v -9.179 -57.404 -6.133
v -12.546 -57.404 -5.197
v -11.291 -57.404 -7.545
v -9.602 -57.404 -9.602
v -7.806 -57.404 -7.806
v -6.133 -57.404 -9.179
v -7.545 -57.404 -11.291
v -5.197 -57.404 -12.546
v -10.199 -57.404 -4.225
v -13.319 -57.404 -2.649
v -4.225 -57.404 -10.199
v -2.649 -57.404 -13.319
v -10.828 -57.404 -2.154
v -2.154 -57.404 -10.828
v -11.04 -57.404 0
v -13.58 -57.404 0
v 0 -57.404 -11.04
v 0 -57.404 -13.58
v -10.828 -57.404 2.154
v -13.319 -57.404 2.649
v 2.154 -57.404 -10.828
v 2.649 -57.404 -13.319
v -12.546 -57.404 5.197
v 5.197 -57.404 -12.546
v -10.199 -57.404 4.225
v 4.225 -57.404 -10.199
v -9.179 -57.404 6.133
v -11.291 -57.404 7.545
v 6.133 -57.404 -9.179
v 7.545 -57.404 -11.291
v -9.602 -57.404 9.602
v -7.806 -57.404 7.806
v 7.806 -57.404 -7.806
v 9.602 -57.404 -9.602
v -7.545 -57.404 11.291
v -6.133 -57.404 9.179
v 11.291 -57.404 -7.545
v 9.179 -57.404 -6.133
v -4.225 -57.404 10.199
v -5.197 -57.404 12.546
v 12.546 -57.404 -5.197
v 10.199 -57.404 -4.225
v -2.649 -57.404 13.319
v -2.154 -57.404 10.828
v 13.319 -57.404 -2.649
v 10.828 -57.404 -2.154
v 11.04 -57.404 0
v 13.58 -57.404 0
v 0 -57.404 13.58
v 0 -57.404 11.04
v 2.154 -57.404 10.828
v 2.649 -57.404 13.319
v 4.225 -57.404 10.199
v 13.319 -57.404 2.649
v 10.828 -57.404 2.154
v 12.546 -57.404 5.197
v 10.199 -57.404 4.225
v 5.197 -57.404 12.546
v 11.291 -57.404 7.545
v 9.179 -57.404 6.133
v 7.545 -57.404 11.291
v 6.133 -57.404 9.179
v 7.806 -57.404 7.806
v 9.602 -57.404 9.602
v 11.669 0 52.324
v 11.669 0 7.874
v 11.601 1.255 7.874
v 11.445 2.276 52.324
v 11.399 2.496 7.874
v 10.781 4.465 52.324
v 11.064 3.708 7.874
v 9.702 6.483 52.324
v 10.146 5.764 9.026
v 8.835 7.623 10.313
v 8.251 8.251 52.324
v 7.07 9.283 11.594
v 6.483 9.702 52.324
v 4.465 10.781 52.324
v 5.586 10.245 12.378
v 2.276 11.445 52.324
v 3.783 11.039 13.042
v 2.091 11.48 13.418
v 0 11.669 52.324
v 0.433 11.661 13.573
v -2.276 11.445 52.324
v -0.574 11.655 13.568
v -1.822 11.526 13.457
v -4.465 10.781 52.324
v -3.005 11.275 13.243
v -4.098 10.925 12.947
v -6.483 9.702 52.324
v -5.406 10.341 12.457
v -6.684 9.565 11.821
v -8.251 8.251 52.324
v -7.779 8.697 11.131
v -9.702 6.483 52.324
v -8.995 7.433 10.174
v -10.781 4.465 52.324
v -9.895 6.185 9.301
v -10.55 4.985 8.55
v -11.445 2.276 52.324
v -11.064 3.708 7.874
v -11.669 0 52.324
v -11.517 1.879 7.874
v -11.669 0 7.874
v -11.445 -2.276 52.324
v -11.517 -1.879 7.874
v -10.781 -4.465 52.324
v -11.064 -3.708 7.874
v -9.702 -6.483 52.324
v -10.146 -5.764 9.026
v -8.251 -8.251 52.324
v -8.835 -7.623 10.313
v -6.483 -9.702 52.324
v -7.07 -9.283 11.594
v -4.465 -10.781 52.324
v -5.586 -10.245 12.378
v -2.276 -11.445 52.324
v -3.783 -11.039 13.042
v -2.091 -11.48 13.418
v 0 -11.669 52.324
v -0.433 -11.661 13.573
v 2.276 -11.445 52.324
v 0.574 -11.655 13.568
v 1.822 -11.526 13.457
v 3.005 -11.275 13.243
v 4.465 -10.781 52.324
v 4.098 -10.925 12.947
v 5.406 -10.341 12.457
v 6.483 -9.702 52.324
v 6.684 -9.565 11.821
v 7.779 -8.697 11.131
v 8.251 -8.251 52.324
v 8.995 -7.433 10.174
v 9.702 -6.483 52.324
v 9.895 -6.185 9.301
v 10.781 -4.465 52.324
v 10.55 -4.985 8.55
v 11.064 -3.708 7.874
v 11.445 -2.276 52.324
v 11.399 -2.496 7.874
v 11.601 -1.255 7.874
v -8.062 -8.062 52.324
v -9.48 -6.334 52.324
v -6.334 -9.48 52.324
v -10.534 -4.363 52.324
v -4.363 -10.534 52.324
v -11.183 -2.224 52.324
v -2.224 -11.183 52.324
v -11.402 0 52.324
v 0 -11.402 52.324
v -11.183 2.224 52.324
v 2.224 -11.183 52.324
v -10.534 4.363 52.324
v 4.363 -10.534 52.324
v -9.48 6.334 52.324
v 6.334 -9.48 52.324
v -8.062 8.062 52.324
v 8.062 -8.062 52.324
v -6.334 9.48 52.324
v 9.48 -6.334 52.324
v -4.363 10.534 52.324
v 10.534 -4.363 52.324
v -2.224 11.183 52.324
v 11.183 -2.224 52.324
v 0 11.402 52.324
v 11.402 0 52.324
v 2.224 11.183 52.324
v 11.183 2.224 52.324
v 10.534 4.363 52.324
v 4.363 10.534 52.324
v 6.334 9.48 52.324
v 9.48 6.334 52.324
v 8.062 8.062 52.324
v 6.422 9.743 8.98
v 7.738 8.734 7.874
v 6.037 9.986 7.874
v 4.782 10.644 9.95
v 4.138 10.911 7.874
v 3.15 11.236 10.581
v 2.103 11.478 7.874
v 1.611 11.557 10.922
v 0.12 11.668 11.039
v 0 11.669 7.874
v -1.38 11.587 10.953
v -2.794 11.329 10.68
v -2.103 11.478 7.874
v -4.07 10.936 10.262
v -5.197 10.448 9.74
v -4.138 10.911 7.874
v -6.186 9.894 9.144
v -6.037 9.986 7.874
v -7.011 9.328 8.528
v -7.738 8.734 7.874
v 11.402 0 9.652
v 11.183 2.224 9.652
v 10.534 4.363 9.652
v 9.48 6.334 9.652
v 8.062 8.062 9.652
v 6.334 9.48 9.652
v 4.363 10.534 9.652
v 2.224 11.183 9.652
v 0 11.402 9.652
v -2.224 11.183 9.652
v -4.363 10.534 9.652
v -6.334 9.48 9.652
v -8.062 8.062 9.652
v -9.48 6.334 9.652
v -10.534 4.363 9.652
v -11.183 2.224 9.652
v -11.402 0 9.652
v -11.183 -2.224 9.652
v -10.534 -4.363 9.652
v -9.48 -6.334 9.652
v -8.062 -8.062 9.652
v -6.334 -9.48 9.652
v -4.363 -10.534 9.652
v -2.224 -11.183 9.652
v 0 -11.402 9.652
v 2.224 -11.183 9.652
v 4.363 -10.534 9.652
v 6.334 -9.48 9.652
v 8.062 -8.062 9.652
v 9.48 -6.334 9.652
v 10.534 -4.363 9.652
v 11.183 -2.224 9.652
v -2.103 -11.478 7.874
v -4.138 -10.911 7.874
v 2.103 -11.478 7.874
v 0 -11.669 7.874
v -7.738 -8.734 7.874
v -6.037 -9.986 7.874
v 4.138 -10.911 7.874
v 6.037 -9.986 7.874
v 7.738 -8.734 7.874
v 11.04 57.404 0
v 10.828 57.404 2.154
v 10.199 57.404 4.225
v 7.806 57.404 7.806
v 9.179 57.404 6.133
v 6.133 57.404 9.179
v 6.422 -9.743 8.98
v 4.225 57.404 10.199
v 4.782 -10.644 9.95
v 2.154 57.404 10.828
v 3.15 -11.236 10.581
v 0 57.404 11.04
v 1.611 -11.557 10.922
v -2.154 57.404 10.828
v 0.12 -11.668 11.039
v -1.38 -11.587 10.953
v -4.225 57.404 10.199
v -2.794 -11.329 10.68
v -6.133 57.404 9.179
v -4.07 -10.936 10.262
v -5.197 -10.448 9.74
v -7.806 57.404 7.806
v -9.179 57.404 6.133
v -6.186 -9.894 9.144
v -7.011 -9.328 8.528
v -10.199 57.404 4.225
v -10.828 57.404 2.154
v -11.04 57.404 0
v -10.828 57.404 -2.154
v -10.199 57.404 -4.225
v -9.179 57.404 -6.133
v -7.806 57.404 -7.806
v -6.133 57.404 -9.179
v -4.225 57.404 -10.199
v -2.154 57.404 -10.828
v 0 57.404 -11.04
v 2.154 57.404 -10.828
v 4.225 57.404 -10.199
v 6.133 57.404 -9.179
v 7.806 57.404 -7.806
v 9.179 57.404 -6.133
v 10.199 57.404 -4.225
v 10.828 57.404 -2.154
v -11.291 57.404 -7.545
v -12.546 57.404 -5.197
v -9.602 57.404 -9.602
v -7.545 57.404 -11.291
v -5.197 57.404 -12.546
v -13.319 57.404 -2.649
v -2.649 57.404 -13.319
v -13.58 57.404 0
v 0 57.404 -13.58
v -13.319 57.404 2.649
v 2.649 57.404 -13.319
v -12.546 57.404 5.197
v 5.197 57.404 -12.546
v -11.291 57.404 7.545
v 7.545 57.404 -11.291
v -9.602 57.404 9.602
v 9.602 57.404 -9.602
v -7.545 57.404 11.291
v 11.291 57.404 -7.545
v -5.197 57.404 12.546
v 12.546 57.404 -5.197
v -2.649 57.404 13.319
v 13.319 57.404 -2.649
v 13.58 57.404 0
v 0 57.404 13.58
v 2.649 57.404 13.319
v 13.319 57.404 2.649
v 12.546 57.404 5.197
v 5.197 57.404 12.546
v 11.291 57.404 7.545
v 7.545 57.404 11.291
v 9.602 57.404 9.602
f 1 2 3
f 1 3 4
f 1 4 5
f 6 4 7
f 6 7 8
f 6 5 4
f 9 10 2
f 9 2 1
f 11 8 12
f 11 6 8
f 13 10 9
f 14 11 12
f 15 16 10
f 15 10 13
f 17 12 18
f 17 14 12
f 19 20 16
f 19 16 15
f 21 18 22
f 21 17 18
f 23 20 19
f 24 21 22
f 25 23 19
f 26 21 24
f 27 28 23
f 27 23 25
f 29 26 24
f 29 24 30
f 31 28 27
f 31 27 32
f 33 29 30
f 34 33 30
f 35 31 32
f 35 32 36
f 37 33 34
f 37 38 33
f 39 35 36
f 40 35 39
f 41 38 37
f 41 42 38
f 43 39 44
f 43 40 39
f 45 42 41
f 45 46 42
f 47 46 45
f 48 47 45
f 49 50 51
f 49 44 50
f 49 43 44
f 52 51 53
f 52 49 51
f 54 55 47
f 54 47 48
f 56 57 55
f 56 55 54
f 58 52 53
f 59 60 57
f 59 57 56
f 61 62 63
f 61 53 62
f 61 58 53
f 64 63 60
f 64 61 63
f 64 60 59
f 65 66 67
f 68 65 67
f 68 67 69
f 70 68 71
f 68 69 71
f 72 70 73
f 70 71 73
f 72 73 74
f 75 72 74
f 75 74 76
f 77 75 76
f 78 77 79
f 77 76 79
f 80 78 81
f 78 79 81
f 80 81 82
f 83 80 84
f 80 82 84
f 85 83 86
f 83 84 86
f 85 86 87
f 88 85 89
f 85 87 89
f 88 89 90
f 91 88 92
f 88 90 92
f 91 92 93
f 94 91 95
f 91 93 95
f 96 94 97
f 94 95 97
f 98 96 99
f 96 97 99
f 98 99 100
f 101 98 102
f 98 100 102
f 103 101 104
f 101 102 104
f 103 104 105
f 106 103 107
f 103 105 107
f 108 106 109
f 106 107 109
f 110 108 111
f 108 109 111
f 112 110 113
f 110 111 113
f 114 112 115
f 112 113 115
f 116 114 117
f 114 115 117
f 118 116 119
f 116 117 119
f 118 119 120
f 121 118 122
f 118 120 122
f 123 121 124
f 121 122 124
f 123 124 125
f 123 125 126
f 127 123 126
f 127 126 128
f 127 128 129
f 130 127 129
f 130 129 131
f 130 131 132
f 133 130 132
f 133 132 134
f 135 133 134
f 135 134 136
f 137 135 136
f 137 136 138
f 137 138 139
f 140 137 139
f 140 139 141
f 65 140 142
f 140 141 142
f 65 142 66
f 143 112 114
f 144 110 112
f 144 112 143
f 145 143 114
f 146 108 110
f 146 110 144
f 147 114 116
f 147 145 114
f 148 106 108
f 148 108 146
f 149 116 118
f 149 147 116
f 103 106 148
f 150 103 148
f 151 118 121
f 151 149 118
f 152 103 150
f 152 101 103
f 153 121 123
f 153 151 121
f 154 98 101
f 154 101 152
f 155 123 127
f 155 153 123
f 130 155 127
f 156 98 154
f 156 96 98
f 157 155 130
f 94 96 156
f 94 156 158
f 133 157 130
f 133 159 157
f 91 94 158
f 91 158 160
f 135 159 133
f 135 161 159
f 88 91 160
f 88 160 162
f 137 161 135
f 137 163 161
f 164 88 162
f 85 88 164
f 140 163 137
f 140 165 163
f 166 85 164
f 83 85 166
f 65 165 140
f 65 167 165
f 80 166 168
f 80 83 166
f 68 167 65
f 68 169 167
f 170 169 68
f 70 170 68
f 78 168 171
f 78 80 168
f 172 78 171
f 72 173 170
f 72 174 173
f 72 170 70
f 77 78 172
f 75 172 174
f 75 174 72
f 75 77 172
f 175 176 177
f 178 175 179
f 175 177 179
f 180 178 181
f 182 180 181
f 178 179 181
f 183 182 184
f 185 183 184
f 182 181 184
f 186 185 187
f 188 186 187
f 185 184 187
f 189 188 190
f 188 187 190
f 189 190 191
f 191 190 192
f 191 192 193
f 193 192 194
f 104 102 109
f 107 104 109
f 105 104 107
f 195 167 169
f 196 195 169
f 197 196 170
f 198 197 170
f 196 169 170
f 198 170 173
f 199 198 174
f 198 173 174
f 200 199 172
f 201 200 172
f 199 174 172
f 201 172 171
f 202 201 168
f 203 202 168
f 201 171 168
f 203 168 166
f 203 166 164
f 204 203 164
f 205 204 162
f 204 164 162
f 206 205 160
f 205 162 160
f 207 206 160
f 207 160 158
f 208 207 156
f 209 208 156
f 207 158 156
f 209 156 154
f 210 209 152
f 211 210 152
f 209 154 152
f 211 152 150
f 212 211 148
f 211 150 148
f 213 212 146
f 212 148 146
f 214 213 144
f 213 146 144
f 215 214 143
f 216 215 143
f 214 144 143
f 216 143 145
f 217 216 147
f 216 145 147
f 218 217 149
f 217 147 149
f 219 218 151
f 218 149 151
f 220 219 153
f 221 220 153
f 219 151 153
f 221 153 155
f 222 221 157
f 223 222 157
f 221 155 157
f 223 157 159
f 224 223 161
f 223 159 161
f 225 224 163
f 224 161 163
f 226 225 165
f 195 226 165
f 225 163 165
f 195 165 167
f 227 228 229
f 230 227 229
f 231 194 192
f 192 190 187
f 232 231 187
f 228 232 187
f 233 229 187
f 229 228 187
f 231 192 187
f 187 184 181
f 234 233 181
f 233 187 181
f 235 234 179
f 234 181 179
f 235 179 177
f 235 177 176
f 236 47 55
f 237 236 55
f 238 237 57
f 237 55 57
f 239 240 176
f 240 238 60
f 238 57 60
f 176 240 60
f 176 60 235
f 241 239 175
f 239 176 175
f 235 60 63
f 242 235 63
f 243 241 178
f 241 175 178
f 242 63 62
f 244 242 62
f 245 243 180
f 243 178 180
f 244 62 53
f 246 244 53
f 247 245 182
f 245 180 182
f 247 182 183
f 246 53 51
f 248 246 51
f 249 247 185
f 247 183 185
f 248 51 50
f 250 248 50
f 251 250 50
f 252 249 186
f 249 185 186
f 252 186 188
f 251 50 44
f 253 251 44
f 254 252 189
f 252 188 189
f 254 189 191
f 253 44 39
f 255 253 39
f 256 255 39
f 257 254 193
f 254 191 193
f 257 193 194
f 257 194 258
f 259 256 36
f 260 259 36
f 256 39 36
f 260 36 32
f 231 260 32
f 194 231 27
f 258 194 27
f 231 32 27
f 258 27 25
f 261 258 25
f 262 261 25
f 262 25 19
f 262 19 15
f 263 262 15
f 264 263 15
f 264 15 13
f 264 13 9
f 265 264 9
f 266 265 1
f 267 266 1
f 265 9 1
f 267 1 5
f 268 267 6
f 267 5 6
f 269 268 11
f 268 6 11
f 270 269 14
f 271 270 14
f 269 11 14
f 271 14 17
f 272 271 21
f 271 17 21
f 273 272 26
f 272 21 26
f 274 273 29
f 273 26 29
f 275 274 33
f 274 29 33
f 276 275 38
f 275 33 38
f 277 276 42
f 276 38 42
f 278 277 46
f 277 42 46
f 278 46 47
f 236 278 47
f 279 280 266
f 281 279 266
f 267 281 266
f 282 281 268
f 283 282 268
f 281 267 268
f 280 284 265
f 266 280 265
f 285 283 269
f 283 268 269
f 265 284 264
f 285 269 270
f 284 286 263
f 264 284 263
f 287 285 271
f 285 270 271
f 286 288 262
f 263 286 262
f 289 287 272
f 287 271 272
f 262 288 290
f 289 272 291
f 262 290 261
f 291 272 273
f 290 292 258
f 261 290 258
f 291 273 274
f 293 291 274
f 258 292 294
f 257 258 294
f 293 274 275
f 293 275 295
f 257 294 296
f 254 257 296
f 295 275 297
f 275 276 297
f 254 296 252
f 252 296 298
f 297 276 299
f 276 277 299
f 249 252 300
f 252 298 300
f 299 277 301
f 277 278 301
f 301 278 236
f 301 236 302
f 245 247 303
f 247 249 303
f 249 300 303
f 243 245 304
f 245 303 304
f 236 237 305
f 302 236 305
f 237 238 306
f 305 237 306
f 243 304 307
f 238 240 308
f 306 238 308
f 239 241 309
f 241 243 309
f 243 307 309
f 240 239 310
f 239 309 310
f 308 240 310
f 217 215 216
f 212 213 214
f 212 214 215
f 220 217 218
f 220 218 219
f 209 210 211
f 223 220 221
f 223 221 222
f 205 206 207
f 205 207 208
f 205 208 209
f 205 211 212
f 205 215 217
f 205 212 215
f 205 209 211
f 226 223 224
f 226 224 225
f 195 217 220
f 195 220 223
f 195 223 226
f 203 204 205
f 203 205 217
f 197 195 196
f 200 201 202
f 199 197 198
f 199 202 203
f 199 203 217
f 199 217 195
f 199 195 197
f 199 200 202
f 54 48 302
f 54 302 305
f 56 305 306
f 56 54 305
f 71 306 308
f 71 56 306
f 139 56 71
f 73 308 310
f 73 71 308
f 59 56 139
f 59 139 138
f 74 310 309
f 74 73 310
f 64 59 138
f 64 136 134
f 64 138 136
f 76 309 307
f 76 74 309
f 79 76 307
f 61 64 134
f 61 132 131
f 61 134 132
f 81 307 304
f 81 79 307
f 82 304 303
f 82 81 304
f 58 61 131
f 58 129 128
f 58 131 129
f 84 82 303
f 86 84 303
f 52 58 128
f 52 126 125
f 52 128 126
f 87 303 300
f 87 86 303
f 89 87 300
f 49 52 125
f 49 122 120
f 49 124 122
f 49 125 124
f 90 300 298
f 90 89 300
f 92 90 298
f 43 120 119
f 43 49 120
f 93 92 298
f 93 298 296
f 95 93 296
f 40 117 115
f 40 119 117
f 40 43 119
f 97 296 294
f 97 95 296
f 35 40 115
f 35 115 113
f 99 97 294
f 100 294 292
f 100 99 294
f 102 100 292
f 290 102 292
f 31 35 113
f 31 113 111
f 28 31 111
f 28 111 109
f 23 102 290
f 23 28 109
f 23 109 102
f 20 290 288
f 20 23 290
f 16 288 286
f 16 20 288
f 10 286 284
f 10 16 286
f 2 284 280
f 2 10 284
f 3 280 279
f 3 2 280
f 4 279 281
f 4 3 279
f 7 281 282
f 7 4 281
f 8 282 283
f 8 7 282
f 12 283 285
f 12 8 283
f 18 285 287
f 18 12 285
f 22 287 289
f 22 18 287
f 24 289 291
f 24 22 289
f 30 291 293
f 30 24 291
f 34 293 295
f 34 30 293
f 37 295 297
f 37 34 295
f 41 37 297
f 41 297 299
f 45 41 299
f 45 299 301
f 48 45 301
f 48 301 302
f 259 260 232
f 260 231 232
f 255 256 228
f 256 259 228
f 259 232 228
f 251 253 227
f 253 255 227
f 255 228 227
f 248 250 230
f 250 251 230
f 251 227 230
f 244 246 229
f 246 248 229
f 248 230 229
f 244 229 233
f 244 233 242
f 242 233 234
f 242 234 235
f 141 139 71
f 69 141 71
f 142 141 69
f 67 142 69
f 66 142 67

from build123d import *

# Parameters (mm, degrees)
F0_R     = 13.579833
F1_DEPTH = 57.404
F2_T     = -2.54
F4_R     = 11.66888
F5_DEPTH = 44.45
F6_R     = 11.401717
F7_DEPTH = 42.672


with BuildPart() as f1:
    # F0 (on Front) → F1 (new body, symmetric)
    with BuildSketch(Plane.XZ):
        Circle(F0_R)
    extrude(amount=F1_DEPTH, both=True)

    # F2
    f2_openings = [f1.faces().sort_by_distance(p)[0] for p in [
        (0, -57.404, 0),
        (0, 57.404, 0),
    ]]
    offset(amount=F2_T, openings=f2_openings)

    # F4 (on offset) → F5 (join)
    with BuildSketch(Plane.XY.offset(7.874)):
        Circle(F4_R)
    extrude(amount=F5_DEPTH)

    # F6 (on face) → F7 (cut)
    with BuildSketch(Plane.XY.offset(52.324)):
        Circle(F6_R)
    extrude(amount=-F7_DEPTH, mode=Mode.SUBTRACT)


solid = f1.part
